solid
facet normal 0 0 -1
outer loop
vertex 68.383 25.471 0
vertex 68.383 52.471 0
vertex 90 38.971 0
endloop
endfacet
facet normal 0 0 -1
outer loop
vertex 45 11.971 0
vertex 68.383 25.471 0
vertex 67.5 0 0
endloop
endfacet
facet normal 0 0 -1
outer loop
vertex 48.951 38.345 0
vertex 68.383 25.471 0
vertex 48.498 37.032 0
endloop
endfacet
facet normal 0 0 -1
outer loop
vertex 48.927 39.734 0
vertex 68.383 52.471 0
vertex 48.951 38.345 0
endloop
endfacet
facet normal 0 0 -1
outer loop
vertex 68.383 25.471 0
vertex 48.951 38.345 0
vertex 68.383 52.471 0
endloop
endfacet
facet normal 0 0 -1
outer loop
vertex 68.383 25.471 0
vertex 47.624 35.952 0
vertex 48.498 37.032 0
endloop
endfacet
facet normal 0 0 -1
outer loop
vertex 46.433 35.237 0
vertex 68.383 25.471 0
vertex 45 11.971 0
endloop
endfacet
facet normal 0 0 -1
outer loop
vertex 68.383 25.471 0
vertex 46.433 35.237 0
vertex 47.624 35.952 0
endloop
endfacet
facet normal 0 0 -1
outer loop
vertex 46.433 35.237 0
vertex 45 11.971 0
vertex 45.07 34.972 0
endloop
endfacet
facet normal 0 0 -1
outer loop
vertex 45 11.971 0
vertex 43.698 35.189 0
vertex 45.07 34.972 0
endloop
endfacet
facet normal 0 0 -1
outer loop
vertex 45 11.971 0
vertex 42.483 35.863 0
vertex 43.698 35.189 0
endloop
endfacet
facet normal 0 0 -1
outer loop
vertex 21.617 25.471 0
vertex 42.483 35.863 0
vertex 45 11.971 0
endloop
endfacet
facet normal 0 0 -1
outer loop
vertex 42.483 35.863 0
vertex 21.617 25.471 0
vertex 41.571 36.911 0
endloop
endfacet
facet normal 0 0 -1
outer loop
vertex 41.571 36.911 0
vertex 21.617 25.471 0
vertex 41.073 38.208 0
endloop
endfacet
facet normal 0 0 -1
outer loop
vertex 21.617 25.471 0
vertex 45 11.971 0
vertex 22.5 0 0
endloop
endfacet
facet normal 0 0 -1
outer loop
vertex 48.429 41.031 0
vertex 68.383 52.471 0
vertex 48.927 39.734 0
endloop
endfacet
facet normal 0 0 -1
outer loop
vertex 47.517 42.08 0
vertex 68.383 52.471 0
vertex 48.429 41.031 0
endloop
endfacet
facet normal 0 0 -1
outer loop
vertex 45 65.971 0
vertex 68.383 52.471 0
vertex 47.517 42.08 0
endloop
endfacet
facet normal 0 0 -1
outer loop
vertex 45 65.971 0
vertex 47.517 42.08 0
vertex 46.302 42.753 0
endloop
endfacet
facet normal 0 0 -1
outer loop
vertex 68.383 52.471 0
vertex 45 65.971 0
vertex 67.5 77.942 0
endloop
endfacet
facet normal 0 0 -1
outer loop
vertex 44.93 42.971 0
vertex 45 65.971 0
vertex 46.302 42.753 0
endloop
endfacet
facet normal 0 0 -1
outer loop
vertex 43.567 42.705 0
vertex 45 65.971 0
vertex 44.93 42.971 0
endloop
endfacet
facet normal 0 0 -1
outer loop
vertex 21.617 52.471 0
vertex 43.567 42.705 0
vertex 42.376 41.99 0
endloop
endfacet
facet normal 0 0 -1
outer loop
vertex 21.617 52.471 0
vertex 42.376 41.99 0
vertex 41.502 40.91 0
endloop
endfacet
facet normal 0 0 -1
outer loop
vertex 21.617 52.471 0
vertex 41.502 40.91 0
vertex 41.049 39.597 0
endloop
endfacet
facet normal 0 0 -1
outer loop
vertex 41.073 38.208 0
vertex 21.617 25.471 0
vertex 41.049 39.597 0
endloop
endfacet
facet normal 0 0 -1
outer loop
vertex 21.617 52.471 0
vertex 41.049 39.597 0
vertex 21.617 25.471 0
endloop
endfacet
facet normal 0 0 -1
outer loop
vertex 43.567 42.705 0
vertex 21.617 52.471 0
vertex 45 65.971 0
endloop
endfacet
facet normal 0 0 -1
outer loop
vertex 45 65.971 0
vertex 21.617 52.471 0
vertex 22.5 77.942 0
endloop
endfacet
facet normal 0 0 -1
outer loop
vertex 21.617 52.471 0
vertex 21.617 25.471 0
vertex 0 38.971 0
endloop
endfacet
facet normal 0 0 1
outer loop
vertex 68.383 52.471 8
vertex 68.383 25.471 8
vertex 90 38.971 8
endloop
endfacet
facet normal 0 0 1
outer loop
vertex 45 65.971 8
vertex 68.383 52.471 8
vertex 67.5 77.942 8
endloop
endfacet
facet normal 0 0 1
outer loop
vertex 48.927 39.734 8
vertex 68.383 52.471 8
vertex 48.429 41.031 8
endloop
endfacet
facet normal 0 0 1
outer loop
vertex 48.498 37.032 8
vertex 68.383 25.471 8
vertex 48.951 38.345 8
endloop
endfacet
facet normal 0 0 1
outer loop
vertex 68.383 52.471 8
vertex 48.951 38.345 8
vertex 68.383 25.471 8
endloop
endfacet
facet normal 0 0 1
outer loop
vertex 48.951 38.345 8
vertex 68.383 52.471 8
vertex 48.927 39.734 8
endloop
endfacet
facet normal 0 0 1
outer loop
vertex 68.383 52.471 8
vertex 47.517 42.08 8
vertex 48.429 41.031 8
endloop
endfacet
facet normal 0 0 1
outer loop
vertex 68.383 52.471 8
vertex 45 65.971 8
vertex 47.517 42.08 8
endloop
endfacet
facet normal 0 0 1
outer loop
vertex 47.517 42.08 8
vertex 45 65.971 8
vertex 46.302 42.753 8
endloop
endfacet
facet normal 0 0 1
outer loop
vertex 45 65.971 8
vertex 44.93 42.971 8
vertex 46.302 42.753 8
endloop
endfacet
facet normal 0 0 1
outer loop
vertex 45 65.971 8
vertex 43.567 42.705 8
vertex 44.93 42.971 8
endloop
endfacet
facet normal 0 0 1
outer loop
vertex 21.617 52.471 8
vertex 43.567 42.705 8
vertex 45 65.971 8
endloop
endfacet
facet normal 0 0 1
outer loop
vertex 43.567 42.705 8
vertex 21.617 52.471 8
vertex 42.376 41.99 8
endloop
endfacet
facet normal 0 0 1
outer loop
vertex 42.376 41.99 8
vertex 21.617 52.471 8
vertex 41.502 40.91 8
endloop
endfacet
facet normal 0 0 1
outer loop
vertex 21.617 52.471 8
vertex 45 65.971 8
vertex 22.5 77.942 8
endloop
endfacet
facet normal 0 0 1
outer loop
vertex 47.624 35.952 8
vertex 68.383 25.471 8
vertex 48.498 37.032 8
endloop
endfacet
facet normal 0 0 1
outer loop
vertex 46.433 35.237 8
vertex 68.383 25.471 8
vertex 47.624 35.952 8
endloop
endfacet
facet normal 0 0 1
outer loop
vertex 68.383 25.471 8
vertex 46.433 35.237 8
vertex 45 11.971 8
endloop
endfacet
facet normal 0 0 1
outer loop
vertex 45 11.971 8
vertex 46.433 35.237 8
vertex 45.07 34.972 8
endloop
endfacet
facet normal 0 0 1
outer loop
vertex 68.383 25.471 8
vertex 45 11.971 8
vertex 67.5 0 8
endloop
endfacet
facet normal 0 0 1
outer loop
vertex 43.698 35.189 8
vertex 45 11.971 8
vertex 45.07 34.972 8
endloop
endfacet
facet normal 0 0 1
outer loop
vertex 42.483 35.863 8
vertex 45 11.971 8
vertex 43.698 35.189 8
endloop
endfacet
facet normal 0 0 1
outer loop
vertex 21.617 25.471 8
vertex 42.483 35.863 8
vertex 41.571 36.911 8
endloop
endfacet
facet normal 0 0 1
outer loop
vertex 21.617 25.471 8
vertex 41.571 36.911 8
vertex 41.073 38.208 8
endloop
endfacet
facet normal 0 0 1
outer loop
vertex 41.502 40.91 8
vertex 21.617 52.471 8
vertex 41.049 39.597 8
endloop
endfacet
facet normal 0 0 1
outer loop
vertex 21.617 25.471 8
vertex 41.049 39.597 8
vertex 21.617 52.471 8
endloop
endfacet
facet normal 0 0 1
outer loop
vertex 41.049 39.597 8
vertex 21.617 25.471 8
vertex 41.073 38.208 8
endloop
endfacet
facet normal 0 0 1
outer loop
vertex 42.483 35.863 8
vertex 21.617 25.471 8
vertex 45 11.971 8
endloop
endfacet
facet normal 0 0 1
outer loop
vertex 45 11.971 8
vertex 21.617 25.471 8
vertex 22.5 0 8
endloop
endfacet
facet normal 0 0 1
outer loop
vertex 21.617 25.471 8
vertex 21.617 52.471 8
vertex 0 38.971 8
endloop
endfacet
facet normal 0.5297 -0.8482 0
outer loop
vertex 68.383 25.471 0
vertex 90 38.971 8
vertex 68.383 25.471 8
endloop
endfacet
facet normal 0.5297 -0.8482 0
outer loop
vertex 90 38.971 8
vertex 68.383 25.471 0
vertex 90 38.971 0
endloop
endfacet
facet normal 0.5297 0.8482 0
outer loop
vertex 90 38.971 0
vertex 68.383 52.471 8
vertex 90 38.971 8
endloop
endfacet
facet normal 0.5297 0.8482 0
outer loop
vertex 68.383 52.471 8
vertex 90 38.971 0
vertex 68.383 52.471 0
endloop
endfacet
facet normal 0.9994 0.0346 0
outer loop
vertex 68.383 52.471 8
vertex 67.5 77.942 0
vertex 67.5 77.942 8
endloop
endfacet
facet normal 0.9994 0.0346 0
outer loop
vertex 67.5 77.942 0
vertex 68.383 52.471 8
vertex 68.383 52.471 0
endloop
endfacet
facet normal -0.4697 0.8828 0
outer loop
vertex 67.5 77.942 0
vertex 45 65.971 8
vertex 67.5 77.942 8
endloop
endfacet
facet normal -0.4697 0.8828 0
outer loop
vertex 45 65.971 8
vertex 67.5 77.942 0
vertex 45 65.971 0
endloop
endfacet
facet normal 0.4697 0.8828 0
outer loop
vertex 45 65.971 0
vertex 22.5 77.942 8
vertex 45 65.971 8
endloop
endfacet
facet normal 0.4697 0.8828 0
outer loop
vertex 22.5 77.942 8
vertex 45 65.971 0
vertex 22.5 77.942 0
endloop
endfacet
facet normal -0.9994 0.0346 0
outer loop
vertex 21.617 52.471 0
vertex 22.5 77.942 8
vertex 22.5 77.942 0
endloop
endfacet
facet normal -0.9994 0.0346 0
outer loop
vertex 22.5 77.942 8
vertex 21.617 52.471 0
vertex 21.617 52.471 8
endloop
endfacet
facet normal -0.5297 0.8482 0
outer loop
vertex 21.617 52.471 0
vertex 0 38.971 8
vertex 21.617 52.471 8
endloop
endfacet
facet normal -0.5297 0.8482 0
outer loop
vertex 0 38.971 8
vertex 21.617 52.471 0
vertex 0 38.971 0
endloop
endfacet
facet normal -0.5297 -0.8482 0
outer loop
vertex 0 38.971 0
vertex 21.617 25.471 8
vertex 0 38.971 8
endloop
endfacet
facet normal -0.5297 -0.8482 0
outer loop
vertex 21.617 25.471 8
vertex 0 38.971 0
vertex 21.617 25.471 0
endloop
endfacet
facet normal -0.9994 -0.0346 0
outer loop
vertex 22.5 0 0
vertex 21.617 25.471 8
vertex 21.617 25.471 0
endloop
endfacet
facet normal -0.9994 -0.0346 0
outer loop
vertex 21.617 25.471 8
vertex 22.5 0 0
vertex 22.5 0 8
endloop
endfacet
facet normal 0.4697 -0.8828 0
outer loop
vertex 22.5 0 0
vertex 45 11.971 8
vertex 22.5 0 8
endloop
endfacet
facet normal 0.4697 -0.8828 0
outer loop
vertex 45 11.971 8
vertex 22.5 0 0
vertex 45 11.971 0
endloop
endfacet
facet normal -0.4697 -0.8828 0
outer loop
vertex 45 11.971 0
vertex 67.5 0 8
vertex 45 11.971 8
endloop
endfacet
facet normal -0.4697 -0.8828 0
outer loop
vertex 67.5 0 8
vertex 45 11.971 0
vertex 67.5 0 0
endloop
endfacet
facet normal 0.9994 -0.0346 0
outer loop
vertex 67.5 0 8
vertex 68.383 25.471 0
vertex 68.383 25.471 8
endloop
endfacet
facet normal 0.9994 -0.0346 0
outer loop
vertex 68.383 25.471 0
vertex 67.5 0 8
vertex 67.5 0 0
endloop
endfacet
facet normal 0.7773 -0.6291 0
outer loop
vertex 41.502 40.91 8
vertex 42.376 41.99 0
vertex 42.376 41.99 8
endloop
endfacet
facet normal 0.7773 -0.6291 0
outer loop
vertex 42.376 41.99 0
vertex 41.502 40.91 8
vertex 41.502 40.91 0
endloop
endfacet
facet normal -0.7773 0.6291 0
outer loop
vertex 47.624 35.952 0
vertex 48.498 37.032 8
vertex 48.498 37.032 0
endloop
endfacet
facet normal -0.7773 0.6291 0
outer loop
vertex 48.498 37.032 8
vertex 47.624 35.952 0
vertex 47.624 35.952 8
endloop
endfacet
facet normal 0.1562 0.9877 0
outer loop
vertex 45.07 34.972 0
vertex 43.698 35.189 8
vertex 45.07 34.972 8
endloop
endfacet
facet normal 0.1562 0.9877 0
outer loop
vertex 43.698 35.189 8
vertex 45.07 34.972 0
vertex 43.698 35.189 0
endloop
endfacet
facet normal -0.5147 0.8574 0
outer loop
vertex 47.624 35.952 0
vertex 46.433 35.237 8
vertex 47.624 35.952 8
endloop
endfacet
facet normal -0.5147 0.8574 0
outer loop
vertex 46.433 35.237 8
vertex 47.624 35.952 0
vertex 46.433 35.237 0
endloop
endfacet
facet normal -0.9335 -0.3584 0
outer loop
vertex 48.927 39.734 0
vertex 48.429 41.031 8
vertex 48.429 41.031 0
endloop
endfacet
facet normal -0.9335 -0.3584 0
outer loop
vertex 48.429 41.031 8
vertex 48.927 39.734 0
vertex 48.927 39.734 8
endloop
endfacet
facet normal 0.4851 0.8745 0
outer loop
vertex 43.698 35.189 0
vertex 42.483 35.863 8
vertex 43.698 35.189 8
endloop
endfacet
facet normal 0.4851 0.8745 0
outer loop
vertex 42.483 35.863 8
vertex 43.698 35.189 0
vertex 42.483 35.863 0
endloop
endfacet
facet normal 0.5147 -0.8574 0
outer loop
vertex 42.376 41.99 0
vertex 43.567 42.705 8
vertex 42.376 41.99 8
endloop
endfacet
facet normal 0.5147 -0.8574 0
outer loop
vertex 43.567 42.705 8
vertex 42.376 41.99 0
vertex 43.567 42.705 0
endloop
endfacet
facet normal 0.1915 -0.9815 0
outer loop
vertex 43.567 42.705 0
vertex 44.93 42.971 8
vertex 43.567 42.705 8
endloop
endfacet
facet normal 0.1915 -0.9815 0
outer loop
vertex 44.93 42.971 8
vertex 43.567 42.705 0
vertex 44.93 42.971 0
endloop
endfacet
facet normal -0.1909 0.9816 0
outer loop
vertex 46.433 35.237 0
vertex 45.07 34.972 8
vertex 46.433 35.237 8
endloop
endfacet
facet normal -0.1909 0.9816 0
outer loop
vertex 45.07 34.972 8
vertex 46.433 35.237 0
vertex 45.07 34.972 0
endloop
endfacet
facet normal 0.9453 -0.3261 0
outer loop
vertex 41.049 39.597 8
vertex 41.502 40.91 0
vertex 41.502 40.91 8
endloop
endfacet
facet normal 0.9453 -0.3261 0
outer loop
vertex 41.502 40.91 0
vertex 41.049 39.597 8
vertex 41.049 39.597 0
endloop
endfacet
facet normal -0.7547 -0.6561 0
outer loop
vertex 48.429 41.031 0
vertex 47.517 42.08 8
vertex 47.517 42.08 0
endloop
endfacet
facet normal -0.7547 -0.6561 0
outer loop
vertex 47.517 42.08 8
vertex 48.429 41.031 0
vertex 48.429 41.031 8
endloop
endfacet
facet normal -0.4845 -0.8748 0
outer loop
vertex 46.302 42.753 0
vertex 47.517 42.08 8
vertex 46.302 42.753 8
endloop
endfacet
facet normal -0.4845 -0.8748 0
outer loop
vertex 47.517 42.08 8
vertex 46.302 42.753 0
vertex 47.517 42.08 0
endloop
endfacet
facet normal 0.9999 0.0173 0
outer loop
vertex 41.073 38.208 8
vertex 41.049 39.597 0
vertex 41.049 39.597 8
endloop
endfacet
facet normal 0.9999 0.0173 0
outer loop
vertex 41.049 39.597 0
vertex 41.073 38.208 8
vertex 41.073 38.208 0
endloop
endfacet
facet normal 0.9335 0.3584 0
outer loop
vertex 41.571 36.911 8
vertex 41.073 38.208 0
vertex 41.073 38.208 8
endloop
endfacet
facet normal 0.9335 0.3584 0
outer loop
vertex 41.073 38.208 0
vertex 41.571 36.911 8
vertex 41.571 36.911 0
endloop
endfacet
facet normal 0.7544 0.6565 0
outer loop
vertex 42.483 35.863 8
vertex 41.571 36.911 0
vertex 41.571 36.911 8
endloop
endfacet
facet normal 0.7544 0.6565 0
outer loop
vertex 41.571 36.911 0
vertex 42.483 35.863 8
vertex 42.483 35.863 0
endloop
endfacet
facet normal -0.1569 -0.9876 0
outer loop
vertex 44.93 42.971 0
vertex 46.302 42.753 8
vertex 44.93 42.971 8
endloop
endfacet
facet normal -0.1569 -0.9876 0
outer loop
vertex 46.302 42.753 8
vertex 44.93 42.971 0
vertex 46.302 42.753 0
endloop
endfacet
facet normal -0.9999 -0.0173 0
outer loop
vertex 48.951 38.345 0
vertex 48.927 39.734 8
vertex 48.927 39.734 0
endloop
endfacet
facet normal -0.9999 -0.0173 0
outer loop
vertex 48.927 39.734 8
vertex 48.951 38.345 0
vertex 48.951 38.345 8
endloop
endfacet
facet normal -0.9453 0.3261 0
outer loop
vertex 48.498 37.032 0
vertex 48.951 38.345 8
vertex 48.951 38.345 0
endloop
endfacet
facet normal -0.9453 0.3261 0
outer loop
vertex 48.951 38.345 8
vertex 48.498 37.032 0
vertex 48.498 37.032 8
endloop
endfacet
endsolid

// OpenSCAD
$fn = 32;

// ----------------------------------------------------------------------
// Star wheel: 6-point blunt, R45
// ----------------------------------------------------------------------

// --- parameters (mm) ---
n_points = 6;             // number of points / teeth
r_out = 45;               // tip radius
r_in = 27;                // root radius
bore_r = 4;               // centre bore radius
plate_t = 8;              // plate thickness, Z (extrusion height)
bore_d = 8;               // centre bore diameter
fit_tol = 0.1;            // declared fit tolerance (prompt contract)
free_tol = 0.3;           // declared free tolerance (prompt contract)

profile = [[0, 38.971], [21.617, 25.471], [22.5, 0], [45, 11.971], [67.5, 0], [68.383, 25.471], [90, 38.971], [68.383, 52.471], [67.5, 77.942], [45, 65.971], [22.5, 77.942], [21.617, 52.471]];  // primary outline, 12 points, counter clockwise
void_1 = [[48.927, 39.734], [48.429, 41.031], [47.517, 42.08], [46.302, 42.753], [44.93, 42.971], [43.567, 42.705], [42.376, 41.99], [41.502, 40.91], [41.049, 39.597], [41.073, 38.208], [41.571, 36.911], [42.483, 35.863], [43.698, 35.189], [45.07, 34.972], [46.433, 35.237], [47.624, 35.952], [48.498, 37.032], [48.951, 38.345]];  // centre bore, 18 points

// --- the one profile operation ---
difference() {
  linear_extrude(height = plate_t) polygon(points = profile);
  translate([0, 0, -1])
    linear_extrude(height = plate_t + 2) polygon(points = void_1);
}
